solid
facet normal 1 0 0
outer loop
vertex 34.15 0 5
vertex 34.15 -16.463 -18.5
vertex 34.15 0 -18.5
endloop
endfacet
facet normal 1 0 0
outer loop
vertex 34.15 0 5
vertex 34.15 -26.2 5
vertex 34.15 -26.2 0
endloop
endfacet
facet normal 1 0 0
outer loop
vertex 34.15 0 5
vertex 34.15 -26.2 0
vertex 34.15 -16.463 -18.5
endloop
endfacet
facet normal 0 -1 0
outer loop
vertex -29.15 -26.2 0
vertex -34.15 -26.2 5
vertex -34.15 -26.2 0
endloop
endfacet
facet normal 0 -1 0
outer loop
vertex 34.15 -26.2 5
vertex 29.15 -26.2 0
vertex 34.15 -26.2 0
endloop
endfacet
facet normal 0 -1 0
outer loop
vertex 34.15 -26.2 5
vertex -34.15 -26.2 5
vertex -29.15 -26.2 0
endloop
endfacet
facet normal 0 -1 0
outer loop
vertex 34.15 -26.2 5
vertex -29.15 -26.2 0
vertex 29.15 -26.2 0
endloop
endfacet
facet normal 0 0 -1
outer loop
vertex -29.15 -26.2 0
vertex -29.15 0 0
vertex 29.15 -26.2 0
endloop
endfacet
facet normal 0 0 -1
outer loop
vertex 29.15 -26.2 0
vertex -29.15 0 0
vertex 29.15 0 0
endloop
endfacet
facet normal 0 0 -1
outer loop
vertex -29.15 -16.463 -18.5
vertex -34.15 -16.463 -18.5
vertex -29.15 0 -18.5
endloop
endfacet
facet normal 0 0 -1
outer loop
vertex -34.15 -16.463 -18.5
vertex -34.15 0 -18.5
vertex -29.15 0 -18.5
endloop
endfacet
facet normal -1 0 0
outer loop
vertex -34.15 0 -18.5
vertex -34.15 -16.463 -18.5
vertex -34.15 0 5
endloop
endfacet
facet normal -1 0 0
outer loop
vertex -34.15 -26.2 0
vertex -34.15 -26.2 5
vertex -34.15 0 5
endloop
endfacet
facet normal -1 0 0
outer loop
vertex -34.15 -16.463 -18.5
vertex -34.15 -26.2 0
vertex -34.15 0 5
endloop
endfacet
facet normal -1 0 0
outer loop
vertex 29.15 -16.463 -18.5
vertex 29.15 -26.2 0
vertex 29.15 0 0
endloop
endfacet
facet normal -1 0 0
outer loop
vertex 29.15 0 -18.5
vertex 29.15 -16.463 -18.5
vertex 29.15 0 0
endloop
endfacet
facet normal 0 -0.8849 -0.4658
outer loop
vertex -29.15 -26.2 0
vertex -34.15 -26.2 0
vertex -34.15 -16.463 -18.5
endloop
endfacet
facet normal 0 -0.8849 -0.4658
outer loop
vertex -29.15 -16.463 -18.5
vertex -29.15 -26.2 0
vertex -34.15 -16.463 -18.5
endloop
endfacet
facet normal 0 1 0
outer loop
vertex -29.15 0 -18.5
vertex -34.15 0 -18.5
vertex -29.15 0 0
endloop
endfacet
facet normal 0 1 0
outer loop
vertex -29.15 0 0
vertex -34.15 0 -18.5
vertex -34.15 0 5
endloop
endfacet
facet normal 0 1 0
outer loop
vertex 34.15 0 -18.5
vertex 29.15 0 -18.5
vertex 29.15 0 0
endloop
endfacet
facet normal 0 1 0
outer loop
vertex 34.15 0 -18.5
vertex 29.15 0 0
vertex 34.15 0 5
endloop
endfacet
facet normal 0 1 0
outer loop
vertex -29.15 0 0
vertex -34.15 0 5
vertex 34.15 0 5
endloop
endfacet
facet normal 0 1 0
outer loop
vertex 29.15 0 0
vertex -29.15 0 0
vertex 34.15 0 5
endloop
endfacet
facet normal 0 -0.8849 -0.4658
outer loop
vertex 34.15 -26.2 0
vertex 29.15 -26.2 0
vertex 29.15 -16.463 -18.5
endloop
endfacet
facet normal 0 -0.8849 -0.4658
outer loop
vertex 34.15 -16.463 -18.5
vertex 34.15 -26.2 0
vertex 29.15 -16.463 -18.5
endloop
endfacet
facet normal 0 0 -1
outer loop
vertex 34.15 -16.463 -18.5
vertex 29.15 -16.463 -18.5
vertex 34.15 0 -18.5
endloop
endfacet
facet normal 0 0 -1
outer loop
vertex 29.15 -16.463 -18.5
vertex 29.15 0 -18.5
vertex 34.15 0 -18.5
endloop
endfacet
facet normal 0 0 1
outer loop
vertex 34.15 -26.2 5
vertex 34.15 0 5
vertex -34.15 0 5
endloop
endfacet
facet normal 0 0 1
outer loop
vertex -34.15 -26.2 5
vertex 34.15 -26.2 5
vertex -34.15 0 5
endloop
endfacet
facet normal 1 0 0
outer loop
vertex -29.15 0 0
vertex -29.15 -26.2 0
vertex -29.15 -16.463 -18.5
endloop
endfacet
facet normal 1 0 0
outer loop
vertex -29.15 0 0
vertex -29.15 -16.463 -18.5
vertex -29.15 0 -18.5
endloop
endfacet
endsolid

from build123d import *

# Parameters (mm, degrees)
F1_DEPTH     = 16.2
F3_DEPTH     = 10
F4_T4_DEPTH  = 5
F4_T10_DEPTH = 5


# Not quite as in the source:
# - a fillet or chamfer that OpenCascade refuses, or shapes differently, is made with other operations: its cross-section is extruded or revolved along the edge and cut away or added


with BuildPart() as f1:
    # F0 (on Front) → F1 (new body)
    with BuildSketch(Plane.XZ):
        Polygon((-29.15, 0), (0, 0), (29.15, 0), (29.15, -18.5), (34.15, -18.5), (34.15, 5), (0, 5), (-34.15, 5), (-34.15, -18.5), (-29.15, -18.5), align=None)
    extrude(amount=F1_DEPTH)

    # F2 (on face) → F3 (join)
    with BuildSketch(Plane.XZ.offset(16.2)):
        Polygon((34.15, 5), (-34.15, 5), (-34.15, 0), (-29.15, 0), (29.15, 0), (34.15, 0), align=None)
    extrude(amount=F3_DEPTH)

    # F4: chamfer of 10 x 19 on 2 edges, made by hand


with BuildPart() as f4_tool2:
    # F4_s3 → F4_t4 (new body)
    with BuildSketch(Plane.YZ.offset(29.15)):
        Polygon((-26.2, 0), (-16.2, -19), (-16.2, 0), align=None)
    extrude(amount=F4_T4_DEPTH)

    split(bisect_by=Plane.XZ.offset(26.2), keep=Keep.BOTTOM)

    split(bisect_by=Plane.XY.offset(-18.5), keep=Keep.TOP)


with BuildPart() as f1_1:
    add(f1.part)

    # F4_t1: union F4_tool2
    add(f4_tool2.part)


with BuildPart() as f4_tool8:
    # F4_s9 → F4_t10 (new body)
    with BuildSketch(Plane.YZ.offset(-34.15)):
        Polygon((-26.2, 0), (-16.2, -19), (-16.2, 0), align=None)
    extrude(amount=F4_T10_DEPTH)

    split(bisect_by=Plane.XZ.offset(26.2), keep=Keep.BOTTOM)

    split(bisect_by=Plane.XY.offset(-18.5), keep=Keep.TOP)


with BuildPart() as f1_2:
    add(f1_1.part)

    # F4_t7: union F4_tool8
    add(f4_tool8.part)


solid = f1_2.part
